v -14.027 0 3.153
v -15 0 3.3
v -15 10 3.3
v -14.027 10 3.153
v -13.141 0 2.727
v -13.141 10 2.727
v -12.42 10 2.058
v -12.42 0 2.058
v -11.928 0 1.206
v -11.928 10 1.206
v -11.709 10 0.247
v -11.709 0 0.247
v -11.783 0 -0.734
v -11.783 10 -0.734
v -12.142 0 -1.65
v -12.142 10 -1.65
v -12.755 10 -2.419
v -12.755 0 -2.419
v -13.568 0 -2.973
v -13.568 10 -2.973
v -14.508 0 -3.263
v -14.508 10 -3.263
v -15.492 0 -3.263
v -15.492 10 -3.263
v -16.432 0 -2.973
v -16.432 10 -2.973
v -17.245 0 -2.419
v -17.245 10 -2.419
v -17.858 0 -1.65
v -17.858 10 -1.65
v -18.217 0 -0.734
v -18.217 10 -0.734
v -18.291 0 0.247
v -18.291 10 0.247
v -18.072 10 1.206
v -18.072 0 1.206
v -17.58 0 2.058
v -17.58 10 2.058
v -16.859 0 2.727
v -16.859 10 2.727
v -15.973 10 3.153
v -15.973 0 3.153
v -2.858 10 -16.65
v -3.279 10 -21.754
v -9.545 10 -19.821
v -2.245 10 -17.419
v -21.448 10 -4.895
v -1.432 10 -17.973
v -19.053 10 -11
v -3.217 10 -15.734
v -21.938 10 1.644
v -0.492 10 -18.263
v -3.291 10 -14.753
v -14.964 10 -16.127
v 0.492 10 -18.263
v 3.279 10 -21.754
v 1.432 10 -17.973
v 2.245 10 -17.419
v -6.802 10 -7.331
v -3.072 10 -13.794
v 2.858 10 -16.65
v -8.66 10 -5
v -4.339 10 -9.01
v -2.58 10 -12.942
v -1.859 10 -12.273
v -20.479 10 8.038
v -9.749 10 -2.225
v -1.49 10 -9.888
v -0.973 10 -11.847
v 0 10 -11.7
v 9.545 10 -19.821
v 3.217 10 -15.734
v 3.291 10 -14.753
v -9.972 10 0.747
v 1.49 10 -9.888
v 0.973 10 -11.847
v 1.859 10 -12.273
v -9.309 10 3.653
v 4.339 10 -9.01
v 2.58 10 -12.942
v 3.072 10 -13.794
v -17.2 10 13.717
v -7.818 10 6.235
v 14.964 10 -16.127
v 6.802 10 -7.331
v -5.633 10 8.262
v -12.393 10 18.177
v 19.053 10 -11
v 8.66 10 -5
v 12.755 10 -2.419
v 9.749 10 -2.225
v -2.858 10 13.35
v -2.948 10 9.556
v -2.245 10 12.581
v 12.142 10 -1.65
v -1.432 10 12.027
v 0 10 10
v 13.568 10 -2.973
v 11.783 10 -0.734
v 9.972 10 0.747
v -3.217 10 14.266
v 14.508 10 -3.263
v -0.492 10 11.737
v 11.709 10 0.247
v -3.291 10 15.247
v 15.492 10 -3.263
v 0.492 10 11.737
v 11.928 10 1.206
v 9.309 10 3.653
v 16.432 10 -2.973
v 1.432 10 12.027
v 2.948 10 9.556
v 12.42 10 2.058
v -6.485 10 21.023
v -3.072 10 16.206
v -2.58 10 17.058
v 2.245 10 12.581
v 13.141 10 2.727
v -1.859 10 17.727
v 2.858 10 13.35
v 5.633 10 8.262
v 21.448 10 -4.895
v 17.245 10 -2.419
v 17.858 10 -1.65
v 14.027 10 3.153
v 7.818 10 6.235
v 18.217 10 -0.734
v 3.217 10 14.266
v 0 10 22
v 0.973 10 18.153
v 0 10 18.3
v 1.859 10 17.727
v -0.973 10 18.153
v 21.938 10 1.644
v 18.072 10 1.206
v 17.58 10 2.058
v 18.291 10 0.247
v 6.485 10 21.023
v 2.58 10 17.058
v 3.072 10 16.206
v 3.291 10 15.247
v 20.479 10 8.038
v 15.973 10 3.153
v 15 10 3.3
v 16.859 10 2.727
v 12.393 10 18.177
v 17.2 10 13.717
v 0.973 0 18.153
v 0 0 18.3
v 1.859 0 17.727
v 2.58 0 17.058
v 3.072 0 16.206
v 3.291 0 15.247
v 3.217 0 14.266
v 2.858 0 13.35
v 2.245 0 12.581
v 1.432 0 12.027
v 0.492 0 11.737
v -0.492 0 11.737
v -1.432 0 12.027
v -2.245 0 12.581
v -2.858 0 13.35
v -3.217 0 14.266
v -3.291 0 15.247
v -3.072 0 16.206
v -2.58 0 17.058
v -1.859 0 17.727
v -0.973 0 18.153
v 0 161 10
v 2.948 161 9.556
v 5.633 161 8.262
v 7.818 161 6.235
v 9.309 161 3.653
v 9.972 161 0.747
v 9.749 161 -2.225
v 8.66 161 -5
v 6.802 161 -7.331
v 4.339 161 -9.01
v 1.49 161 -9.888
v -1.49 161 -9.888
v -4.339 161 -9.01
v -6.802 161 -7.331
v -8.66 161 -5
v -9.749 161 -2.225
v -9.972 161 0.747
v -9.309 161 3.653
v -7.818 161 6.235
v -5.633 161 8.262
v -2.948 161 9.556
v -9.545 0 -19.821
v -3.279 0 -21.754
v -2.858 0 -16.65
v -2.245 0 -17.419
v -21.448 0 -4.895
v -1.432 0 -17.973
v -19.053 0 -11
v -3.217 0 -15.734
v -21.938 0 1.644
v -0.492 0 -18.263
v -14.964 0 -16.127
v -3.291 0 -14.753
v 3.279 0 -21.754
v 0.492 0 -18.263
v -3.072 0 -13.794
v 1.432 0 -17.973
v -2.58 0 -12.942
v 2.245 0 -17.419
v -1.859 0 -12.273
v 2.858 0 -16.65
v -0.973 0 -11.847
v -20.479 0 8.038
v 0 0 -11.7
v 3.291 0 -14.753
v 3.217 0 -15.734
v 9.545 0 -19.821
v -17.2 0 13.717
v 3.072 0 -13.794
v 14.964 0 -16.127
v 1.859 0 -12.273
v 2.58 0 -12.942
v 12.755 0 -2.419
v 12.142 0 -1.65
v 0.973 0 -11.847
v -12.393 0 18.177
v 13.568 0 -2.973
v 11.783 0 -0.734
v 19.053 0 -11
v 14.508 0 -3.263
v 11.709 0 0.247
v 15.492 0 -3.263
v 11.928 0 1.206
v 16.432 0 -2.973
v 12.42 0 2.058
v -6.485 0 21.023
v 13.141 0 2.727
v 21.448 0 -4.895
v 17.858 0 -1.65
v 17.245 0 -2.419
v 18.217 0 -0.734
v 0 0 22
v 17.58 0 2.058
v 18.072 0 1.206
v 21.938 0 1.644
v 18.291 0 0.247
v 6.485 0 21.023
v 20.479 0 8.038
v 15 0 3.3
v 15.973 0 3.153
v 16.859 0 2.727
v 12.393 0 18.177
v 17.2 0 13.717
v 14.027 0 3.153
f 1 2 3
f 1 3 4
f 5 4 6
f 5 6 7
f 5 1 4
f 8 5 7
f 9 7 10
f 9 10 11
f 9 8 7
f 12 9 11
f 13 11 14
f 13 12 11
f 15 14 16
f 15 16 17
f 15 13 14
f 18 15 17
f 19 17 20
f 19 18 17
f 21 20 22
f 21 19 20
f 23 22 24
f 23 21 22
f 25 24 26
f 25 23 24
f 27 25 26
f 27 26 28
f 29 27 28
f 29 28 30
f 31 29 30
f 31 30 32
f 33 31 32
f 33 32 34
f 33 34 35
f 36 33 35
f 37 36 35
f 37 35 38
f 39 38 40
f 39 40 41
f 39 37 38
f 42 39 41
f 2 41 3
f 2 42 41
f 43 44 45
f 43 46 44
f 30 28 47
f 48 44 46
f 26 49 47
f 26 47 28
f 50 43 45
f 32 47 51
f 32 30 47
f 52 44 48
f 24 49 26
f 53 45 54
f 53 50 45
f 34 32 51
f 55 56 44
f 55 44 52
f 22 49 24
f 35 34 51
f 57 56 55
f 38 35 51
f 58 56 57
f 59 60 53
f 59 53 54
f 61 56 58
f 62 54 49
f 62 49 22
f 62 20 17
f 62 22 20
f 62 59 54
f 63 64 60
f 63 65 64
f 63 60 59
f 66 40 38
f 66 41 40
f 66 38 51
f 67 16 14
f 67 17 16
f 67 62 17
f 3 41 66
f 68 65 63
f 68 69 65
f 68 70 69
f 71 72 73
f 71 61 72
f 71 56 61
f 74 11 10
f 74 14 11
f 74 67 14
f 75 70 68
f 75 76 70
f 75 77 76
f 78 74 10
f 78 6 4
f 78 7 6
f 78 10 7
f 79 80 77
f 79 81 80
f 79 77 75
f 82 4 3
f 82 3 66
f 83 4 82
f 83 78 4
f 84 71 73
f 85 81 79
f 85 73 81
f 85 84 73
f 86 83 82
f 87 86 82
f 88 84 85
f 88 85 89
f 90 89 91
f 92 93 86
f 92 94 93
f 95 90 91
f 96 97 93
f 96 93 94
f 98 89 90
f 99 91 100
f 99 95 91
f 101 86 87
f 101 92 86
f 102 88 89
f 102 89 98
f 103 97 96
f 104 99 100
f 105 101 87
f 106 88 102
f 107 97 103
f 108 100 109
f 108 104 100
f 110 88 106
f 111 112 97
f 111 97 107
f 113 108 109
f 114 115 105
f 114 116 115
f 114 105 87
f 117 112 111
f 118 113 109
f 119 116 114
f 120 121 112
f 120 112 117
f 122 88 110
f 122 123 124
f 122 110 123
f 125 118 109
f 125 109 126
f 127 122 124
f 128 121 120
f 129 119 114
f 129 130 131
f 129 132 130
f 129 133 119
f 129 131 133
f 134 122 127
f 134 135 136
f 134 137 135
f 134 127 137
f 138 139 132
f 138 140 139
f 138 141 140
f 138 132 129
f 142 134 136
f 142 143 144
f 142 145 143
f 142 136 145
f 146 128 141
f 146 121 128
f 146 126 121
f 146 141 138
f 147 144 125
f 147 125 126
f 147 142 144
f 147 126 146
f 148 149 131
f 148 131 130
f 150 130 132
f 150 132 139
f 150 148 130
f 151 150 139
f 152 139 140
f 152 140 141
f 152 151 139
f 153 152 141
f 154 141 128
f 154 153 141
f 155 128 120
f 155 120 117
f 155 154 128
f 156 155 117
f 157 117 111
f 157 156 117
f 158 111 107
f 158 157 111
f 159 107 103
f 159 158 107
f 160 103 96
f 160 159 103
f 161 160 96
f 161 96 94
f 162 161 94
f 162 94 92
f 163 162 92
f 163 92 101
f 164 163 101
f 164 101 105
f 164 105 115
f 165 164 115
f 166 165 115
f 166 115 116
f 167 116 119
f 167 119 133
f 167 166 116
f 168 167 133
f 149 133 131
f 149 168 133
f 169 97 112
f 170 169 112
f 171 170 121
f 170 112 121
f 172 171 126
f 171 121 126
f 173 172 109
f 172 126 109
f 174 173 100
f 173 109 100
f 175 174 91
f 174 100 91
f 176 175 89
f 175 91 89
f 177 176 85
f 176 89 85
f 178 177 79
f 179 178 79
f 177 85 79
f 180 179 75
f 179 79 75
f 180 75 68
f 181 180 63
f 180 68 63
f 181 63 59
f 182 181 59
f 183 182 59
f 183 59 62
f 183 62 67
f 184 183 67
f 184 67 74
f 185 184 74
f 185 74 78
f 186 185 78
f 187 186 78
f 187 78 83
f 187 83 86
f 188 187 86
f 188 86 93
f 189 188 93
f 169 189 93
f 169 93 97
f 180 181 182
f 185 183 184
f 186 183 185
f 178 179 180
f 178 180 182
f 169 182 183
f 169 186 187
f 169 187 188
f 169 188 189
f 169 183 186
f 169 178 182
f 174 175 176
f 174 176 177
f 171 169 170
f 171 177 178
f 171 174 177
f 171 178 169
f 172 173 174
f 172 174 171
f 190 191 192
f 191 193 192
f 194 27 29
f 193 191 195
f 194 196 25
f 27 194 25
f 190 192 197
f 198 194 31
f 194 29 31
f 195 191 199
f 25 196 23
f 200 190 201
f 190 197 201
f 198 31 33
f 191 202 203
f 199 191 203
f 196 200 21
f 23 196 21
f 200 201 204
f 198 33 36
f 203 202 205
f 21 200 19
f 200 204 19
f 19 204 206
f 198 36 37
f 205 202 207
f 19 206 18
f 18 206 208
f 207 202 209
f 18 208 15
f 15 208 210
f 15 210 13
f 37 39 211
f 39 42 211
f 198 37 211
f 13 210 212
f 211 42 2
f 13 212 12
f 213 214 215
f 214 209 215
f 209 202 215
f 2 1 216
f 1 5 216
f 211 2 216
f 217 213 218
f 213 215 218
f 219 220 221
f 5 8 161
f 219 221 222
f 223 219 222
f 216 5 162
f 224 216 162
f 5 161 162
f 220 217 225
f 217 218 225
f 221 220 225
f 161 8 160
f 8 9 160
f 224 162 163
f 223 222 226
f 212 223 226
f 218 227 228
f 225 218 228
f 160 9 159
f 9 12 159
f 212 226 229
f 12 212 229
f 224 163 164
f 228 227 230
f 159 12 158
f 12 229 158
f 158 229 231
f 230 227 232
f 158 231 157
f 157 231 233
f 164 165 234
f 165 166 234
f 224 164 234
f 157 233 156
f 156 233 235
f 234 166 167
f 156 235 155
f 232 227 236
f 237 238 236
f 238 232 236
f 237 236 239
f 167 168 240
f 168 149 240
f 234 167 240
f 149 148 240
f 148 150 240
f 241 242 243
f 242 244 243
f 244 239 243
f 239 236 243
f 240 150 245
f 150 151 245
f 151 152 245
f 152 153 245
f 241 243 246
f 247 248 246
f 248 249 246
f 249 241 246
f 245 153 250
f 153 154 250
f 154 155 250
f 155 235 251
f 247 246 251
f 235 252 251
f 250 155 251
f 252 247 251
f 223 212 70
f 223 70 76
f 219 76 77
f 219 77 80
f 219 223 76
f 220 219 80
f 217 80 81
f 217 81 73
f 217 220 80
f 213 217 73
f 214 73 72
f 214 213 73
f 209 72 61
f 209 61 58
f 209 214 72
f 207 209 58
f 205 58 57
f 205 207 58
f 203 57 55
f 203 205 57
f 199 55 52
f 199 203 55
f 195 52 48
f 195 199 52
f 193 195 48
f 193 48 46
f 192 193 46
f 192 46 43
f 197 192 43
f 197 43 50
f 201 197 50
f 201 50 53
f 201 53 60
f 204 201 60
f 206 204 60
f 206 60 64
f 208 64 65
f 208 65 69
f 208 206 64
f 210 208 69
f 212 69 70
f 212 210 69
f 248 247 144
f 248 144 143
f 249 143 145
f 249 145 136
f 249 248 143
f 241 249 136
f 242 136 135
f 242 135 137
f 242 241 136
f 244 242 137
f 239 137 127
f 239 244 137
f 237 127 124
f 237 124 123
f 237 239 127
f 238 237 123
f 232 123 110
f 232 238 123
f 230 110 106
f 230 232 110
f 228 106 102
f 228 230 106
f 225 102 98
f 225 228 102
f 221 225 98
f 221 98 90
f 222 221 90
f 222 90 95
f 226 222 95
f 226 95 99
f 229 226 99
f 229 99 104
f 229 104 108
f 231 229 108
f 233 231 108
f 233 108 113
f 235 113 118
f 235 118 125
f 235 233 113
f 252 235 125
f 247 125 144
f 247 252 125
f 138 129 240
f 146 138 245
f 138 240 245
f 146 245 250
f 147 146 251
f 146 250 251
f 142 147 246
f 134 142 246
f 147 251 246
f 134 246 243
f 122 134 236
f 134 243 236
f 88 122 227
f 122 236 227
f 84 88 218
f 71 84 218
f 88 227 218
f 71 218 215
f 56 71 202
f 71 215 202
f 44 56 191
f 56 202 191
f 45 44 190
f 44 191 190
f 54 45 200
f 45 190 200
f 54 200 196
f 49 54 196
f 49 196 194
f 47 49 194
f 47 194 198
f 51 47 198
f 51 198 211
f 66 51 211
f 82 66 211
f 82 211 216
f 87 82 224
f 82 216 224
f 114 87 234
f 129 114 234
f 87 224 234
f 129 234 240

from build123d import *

# Parameters (mm, degrees)
SKETCH1_R                                 = 10
OUTPUT_SHAFT_20MM_DEPTH                   = 161
SKETCH2_R                                 = 22
SKETCH2_R_2                               = 3.3
OUTPUT_LOWER_FLANGE_WITH_BOLT_HOLES_DEPTH = 10


with BuildPart() as part:
    # Sketch1 → Output_Shaft_20mm (new body)
    with BuildSketch(Plane(origin=(0, 0, 0), x_dir=(1, 0, 0), z_dir=(0, 1, 0))):
        with Locations(Location((0, 0, 0), (0, 0, 270))):
            Circle(SKETCH1_R)
    extrude(amount=OUTPUT_SHAFT_20MM_DEPTH)

    # Sketch2 → Output_Lower_Flange_With_Bolt_Holes (add)
    with BuildSketch(Plane(origin=(0, 0, 0), x_dir=(1, 0, 0), z_dir=(0, 1, 0))):
        with Locations(Location((0, 0, 0), (0, 0, 270))):
            Circle(SKETCH2_R)
        with Locations(Location((-15, 0, 0), (0, 0, 270))):
            Circle(SKETCH2_R_2, mode=Mode.SUBTRACT)
        with Locations(Location((15, 0, 0), (0, 0, 270))):
            Circle(SKETCH2_R_2, mode=Mode.SUBTRACT)
        with Locations(Location((0, -15, 0), (0, 0, 270))):
            Circle(SKETCH2_R_2, mode=Mode.SUBTRACT)
        with Locations(Location((0, 15, 0), (0, 0, 270))):
            Circle(SKETCH2_R_2, mode=Mode.SUBTRACT)
    extrude(amount=OUTPUT_LOWER_FLANGE_WITH_BOLT_HOLES_DEPTH)


solid = part.part
